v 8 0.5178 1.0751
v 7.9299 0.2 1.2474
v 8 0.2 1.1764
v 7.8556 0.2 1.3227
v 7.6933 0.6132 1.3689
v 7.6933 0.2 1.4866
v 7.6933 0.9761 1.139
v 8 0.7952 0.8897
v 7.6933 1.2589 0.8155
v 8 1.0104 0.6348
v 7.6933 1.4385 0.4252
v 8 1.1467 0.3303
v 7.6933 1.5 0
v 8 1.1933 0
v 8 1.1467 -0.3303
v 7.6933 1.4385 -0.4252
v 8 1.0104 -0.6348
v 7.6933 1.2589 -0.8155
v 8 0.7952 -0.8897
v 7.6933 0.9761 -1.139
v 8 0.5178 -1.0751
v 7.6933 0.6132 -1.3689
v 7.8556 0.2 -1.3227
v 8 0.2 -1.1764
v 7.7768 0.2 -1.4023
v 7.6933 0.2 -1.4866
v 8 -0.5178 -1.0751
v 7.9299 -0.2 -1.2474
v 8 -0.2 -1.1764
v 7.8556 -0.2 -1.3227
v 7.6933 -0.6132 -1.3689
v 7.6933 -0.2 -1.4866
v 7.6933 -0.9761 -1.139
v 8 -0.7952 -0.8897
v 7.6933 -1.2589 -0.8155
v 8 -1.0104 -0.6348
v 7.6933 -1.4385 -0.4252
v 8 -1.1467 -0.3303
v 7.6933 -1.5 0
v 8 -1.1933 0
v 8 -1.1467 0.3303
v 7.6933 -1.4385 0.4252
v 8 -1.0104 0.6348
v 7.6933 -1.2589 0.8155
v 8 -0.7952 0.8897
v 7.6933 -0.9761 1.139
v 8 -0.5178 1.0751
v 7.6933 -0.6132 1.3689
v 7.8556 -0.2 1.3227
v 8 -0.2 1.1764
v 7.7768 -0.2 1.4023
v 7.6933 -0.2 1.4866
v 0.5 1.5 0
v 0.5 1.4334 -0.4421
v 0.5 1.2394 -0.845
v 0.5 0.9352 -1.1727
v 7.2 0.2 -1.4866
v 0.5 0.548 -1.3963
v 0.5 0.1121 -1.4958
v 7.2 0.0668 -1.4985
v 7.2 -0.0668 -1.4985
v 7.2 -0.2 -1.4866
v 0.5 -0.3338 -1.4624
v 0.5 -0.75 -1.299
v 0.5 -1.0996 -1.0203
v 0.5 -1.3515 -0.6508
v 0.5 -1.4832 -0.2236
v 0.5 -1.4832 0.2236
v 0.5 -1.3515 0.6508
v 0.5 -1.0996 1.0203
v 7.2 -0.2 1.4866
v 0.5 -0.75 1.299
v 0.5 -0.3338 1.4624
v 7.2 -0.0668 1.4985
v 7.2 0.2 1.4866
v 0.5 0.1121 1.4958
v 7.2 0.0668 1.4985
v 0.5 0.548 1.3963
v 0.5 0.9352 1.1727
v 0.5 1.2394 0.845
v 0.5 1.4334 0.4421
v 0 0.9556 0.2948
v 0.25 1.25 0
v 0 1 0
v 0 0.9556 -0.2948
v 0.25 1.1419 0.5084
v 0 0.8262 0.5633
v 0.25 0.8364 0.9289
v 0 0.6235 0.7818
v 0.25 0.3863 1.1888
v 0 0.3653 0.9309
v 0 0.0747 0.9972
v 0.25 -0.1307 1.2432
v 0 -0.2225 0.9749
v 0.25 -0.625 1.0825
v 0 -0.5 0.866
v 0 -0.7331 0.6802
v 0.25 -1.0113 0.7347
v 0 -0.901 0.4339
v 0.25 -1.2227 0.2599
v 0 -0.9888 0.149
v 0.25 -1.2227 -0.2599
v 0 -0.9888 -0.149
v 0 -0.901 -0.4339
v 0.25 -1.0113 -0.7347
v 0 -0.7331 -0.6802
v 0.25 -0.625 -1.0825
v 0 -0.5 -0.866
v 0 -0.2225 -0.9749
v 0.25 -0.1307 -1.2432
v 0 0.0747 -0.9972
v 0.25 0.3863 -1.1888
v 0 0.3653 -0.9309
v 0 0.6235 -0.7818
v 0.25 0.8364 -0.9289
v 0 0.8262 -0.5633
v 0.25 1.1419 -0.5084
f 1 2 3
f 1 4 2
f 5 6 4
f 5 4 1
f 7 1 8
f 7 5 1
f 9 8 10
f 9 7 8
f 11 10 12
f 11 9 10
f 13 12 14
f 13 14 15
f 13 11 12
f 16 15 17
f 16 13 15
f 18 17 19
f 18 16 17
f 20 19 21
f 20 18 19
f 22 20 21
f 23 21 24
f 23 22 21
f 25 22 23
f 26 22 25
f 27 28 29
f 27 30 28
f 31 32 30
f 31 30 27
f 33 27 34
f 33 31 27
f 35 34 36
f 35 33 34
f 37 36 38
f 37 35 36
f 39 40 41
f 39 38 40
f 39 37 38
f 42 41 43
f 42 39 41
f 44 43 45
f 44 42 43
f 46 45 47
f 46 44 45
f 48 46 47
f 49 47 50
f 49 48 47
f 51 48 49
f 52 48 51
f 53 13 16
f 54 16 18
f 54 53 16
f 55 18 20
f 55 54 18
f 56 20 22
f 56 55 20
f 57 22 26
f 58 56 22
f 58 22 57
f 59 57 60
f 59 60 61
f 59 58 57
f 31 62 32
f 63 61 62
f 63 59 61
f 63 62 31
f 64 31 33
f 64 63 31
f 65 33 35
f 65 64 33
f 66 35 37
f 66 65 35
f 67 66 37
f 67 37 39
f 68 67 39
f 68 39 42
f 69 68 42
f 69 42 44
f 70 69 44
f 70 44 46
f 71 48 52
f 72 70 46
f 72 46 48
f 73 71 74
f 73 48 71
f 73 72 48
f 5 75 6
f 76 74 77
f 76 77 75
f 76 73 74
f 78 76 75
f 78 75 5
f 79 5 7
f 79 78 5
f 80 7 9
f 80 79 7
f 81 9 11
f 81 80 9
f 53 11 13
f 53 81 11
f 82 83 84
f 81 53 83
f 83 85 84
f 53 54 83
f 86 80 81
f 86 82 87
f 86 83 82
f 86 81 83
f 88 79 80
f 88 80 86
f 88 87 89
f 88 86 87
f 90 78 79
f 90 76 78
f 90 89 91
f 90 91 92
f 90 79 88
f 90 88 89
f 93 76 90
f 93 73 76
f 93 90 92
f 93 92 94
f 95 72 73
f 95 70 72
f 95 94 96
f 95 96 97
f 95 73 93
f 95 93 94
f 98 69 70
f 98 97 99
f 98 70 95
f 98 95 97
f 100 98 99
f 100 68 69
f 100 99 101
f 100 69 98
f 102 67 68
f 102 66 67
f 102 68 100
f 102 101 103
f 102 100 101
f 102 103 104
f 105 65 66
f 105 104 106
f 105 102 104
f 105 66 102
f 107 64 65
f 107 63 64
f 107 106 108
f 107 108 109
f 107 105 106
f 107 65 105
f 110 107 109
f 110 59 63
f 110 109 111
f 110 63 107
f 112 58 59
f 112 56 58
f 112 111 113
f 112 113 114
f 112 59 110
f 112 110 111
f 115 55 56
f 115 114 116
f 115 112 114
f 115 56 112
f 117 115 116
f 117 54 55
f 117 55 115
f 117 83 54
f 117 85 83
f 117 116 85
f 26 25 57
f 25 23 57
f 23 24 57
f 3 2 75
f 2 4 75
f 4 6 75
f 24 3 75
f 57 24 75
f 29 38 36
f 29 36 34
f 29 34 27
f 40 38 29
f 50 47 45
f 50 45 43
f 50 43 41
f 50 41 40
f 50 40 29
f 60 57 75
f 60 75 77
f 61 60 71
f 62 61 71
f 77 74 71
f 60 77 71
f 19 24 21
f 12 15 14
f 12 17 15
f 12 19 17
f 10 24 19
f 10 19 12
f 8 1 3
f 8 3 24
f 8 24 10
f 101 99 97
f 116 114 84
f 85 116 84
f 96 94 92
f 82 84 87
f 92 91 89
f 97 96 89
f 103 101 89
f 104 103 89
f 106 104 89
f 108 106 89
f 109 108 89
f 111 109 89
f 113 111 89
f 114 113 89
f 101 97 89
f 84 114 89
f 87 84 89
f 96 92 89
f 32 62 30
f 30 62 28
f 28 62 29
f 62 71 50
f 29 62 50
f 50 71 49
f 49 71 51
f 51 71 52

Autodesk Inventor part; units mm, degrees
ref_plane "YZ Plane" through (0, 0, 0) normal (1, 0, 0) x (0, 1, 0)
ref_plane "XZ Plane" through (0, 0, 0) normal (0, 1, 0) x (-1, 0, 0)
sketch "Sketch1" plane through (0, 0, 0) normal (0, 0, 1) x (1, 0, 0)
  line L0 (0, 0) -> (8, 0)
  line L1 (8, 0) -> (8, 1.5)
  line L2 (8, 1.5) -> (0, 1.5)
  line L3 (0, -0.3) -> (0, 1.8) projected
  line L4 (0, 1.5) -> (0, 0)
  dimension "d0" = 3
  dimension "d2" = 8
revolve "Body" add sketch "Sketch1" angle 360 about axis through (0, 0, 0) along (1, 0, 0)
chamfer "Chamfer1" distance 0.3067 angle 45 1 edges at (8, -1.5, 0) measured on face at (8, -0.2885, 0.9187)
sketch "Sketch2" plane through (0, 0, 0) normal (0, 0, 1) x (1, 0, 0)
  line L0 (8, 1.1933) -> (8, -1.1933) projected
  line L1 (7.04, 0) -> (8.16, 0) projected
  line L2 (8, 0.2) -> (7.2, 0.2)
  line L3 (7.2, 0.2) -> (7.2, 0)
  line L4 (7.2, -0.2) -> (7.2, 0)
  line L5 (7.2, -0.2) -> (8, -0.2)
  dimension "d8" = 0.2
  dimension "d9" = 0.8
extrude "Slot1" cut sketch "Sketch2" against normal mid plane 3
thread "Thread" size "M3x0.5" class "6g" standard "ISO Metric profile" length 8
chamfer "Chamfer2" distance 0.5 angle 45 1 edges at (0, -1.5, 0) measured on face at (2.5644, -0.6479, 1.3529)
ref_plane "Work Plane1" through (4, 0, 0) normal (0, 0, 1) x (1, 0, 0)
equation "\"d8\" = 0.5 * SBR"
equation "\"d9\" = STI"
equation "\"d10\" = NND"
equation "\"d3\" = -0.5 * GD1 + 0.5 * NND"
equation "\"d4\" = FAWI"
equation "\"d34\" = -0.5 * GD1 + 0.5 * NND"
equation "\"d5\" = NLG"
equation "\"d14\" = FAWI"
equation "\"d0\" = NND"
equation "\"d2\" = NLG"
equation "\"NND\" = 3"
equation "\"NLG\" = 8"
equation "\"FAWI\" = 45deg"
equation "\"GD1\" = THREADDIA - 1.2269 * PTC"
equation "\"FAWI1\" = 45deg"
equation "\"SPD\" = 2"
equation "\"SBR\" = 0.4"
equation "\"STI\" = 0.8"
equation "\"GUL\" = 0.61345 * PTC"
equation "\"THREADDIA\" = 3"
equation "\"TOA\" = 30deg"
equation "\"PTC\" = 0.5"
equation "\"GAL\" = 0.61345 * PTC"
properties part number "ISO 4766 - M3 x 8" material "Stainless Steel, 440C"
